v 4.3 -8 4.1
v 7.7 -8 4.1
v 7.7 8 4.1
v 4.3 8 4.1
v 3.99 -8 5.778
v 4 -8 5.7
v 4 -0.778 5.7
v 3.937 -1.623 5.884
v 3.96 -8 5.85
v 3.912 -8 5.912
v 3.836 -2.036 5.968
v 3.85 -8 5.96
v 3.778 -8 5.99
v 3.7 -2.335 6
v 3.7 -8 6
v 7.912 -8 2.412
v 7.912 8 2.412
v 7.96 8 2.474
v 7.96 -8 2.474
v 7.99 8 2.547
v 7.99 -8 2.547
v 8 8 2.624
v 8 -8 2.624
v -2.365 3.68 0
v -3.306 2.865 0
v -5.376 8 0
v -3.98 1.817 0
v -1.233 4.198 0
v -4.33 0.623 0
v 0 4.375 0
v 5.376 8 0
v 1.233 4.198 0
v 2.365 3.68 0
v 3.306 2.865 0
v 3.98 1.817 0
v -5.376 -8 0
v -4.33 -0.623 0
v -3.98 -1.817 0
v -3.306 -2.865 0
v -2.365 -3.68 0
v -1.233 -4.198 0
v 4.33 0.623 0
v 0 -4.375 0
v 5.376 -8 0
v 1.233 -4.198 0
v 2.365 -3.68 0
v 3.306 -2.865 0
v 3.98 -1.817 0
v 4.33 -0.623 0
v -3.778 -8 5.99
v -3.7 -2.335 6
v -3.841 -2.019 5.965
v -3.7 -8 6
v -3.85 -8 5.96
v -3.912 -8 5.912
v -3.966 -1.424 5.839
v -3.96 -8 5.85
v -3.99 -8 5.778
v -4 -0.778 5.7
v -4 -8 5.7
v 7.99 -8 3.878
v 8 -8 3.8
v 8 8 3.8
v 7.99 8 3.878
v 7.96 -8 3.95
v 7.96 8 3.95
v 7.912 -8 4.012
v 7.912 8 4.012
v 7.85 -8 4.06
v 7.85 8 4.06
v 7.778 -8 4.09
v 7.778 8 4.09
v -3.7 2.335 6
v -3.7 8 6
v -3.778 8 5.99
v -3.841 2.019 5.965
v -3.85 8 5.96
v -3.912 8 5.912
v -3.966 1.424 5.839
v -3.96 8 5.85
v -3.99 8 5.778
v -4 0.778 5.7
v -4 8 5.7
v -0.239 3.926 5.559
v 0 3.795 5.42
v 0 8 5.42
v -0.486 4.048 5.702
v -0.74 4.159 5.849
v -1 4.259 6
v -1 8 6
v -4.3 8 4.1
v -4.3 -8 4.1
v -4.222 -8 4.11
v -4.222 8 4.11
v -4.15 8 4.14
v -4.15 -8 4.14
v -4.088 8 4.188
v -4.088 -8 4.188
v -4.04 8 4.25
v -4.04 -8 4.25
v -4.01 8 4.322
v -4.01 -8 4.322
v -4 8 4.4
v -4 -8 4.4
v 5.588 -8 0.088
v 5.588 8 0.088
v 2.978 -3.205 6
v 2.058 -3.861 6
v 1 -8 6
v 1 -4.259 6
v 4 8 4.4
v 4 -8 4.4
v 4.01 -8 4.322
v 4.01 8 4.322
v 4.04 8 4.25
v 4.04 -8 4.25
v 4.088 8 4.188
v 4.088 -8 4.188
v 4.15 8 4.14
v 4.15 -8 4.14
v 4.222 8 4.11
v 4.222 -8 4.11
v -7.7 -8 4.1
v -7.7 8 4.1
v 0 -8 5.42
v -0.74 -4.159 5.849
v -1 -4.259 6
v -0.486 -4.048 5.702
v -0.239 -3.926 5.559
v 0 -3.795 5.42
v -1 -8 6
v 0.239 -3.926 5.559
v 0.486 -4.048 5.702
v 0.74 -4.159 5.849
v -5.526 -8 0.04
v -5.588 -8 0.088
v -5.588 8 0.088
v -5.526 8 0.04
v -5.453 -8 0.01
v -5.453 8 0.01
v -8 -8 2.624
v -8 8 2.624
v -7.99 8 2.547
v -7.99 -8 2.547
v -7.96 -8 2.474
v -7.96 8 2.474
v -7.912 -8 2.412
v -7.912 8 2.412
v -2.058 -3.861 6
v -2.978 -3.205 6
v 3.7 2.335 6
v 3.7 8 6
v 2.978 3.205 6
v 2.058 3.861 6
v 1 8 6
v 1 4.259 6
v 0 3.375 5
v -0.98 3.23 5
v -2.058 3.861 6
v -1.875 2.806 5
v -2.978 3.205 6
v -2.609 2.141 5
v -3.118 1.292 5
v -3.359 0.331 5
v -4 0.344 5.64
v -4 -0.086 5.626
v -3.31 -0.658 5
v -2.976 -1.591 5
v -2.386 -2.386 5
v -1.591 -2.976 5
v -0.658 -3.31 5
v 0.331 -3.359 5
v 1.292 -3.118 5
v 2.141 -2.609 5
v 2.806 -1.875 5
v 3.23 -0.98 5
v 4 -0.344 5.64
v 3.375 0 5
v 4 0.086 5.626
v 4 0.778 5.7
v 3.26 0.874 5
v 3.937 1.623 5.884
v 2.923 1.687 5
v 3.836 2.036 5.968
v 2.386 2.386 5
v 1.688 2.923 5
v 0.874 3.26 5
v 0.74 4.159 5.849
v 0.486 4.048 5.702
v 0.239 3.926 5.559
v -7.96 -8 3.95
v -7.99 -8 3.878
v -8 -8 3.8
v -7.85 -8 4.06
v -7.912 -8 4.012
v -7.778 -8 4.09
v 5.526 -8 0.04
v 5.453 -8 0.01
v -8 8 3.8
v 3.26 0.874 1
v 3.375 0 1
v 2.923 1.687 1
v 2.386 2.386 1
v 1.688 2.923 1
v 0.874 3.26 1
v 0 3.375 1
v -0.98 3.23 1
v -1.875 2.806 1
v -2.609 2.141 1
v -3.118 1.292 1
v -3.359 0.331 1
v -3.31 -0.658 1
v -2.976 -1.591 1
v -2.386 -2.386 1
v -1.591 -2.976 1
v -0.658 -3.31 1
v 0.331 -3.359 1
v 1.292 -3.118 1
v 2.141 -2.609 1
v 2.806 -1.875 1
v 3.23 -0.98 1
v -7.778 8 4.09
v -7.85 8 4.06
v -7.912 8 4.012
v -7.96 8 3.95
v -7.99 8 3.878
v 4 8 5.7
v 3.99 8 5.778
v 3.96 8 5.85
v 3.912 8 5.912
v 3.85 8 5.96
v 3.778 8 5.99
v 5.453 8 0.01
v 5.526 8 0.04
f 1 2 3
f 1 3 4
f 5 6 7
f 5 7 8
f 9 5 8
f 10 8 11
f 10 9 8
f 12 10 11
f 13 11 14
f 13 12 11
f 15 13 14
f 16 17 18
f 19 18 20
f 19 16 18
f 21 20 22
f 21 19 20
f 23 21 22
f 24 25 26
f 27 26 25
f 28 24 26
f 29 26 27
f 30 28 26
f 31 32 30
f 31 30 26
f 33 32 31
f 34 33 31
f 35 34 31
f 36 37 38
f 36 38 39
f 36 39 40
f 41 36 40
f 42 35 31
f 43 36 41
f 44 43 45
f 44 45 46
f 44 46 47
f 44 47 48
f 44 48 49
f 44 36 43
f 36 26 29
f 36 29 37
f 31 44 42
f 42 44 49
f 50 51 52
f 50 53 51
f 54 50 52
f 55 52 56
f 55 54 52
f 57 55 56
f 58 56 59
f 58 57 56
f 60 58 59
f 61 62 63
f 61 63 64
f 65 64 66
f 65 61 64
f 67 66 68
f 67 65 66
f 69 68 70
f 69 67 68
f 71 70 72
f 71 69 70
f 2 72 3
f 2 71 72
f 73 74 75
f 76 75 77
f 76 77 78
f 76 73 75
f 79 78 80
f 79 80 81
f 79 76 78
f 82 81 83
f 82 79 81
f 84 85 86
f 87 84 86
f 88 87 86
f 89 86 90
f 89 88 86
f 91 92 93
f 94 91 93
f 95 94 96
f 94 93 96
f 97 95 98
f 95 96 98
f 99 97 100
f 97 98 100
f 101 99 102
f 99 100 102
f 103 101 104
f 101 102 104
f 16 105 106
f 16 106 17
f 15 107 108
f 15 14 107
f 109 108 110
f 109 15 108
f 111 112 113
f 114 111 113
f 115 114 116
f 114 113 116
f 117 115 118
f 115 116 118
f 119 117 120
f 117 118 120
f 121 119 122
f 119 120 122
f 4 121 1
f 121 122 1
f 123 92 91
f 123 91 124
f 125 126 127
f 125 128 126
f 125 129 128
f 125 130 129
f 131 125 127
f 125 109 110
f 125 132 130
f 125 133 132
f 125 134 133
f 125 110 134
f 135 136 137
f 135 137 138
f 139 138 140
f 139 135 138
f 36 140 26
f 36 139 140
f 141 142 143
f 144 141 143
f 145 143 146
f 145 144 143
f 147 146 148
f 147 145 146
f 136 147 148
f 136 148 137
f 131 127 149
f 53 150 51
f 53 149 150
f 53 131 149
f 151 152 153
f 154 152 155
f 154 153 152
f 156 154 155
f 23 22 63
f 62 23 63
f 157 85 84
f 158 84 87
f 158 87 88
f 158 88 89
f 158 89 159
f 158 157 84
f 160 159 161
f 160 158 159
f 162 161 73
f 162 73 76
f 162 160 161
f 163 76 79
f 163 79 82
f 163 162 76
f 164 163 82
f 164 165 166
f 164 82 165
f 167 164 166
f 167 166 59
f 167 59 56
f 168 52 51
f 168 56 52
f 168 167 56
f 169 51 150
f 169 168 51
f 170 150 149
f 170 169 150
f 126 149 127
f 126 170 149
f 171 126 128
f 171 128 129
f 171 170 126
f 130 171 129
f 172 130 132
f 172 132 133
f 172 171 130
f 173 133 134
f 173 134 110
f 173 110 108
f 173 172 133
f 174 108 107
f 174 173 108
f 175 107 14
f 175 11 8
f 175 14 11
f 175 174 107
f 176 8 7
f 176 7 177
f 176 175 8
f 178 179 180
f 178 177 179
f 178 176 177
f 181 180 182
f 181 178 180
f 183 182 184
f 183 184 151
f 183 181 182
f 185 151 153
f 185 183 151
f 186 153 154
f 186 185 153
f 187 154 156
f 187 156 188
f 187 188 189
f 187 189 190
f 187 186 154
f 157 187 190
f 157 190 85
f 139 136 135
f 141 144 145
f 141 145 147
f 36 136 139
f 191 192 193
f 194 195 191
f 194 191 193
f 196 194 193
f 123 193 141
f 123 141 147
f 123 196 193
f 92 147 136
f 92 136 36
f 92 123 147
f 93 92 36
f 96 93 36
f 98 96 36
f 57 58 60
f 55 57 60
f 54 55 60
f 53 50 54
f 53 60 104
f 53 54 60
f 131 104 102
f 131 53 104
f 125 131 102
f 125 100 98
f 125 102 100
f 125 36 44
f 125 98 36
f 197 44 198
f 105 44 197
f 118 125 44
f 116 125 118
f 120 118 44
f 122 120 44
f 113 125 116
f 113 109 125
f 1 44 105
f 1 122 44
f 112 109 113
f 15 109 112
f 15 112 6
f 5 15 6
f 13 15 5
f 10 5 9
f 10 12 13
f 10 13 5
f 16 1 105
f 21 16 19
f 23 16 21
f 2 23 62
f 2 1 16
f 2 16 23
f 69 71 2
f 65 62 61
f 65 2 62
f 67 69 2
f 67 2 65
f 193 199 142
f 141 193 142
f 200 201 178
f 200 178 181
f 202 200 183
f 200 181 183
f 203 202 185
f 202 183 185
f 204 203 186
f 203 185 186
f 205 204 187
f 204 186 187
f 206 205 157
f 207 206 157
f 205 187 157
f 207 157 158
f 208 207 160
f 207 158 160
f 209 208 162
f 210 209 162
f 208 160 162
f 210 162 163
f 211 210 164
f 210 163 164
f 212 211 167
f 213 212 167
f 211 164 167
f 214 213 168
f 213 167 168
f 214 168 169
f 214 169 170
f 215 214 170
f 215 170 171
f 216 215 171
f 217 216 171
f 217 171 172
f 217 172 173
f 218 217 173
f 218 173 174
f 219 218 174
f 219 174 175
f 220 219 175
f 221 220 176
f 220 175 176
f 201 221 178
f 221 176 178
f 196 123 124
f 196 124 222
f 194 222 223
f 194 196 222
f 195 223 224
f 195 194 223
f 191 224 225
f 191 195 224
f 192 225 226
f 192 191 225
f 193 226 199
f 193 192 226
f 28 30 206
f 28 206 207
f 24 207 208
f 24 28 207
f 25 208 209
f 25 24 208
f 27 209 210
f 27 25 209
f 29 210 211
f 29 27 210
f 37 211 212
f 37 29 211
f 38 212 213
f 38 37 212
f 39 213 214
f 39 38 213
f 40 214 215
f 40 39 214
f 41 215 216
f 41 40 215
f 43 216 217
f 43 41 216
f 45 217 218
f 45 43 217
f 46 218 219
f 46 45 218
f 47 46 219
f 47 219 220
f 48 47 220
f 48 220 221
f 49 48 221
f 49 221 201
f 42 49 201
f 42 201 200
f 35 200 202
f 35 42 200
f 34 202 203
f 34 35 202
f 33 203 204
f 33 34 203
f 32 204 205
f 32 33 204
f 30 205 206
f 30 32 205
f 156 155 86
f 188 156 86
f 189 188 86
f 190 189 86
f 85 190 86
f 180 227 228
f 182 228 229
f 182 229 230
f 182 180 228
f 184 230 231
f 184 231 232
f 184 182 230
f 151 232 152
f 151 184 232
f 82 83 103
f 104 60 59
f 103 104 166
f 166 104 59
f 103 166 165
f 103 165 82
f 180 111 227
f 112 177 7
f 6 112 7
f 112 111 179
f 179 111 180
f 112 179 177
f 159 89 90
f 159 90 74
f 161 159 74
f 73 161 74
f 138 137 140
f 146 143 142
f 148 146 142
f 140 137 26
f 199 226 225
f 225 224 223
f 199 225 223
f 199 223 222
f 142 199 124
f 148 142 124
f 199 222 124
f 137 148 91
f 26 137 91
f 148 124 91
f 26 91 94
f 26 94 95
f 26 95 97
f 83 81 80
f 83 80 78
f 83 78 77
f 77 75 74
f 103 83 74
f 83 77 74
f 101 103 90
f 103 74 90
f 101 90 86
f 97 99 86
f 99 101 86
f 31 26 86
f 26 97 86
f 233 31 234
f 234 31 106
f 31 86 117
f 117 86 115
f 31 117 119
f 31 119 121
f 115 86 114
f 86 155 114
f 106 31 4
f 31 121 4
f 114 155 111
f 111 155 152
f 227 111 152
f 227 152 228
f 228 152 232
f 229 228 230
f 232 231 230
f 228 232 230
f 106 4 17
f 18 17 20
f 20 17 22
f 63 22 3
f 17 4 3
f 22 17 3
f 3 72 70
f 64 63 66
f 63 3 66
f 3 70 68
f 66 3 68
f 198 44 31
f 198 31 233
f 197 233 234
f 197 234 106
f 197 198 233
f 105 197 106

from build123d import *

# Parameters (mm, degrees)
PAD_DEPTH   = 8
SKETCH001_R = 3.375
HOLE_DEPTH  = 6.001


with BuildPart() as part:
    # Sketch → Pad (new body, symmetric)
    with BuildSketch(Plane.XZ):
        with BuildLine():
            Line((-1, 6), (-3.7, 6))
            ThreePointArc((-3.7, 6), (-3.912132, 5.912132), (-4, 5.7))
            Line((-4, 5.7), (-4, 4.4))
            ThreePointArc((-4.3, 4.1), (-4.087868, 4.187868), (-4, 4.4))
            Line((-4.3, 4.1), (-7.7, 4.1))
            ThreePointArc((-7.7, 4.1), (-7.912132, 4.012132), (-8, 3.8))
            Line((-8, 3.8), (-8, 2.624264))
            ThreePointArc((-8, 2.624264), (-7.977164, 2.509459), (-7.912132, 2.412132))
            Line((-7.912132, 2.412132), (-5.587868, 0.087868))
            ThreePointArc((-5.587868, 0.087868), (-5.490541, 0.022836), (-5.375736, 0))
            Line((-5.375736, 0), (5.375736, 0))
            ThreePointArc((5.375736, 0), (5.490541, 0.022836), (5.587868, 0.087868))
            Line((5.587868, 0.087868), (7.912132, 2.412132))
            ThreePointArc((7.912132, 2.412132), (7.977164, 2.509459), (8, 2.624264))
            Line((8, 2.624264), (8, 3.8))
            ThreePointArc((8, 3.8), (7.912132, 4.012132), (7.7, 4.1))
            Line((7.7, 4.1), (4.3, 4.1))
            ThreePointArc((4, 4.4), (4.087868, 4.187868), (4.3, 4.1))
            Line((4, 4.4), (4, 5.7))
            ThreePointArc((4, 5.7), (3.912132, 5.912132), (3.7, 6))
            Line((3.7, 6), (1, 6))
            Line((1, 6), (0, 5.42))
            Line((0, 5.42), (-1, 6))
        make_face()
    extrude(amount=PAD_DEPTH, both=True)

    # Sketch001 → Hole (cut, through all)
    with BuildSketch(Plane.XY.offset(6)):
        Circle(SKETCH001_R)
    extrude(amount=-HOLE_DEPTH, mode=Mode.SUBTRACT)

    # Sketch002 → Groove (revolve, cut)
    with BuildSketch(Plane.YZ):
        Polygon((3.375, 6), (4.375, 6), (3.375, 5), align=None)
        Polygon((3.375, 0), (3.375, 1), (4.375, 0), align=None)
    revolve(axis=Axis((0, 0, 0), (0, 0, 1)), mode=Mode.SUBTRACT)


solid = part.part
